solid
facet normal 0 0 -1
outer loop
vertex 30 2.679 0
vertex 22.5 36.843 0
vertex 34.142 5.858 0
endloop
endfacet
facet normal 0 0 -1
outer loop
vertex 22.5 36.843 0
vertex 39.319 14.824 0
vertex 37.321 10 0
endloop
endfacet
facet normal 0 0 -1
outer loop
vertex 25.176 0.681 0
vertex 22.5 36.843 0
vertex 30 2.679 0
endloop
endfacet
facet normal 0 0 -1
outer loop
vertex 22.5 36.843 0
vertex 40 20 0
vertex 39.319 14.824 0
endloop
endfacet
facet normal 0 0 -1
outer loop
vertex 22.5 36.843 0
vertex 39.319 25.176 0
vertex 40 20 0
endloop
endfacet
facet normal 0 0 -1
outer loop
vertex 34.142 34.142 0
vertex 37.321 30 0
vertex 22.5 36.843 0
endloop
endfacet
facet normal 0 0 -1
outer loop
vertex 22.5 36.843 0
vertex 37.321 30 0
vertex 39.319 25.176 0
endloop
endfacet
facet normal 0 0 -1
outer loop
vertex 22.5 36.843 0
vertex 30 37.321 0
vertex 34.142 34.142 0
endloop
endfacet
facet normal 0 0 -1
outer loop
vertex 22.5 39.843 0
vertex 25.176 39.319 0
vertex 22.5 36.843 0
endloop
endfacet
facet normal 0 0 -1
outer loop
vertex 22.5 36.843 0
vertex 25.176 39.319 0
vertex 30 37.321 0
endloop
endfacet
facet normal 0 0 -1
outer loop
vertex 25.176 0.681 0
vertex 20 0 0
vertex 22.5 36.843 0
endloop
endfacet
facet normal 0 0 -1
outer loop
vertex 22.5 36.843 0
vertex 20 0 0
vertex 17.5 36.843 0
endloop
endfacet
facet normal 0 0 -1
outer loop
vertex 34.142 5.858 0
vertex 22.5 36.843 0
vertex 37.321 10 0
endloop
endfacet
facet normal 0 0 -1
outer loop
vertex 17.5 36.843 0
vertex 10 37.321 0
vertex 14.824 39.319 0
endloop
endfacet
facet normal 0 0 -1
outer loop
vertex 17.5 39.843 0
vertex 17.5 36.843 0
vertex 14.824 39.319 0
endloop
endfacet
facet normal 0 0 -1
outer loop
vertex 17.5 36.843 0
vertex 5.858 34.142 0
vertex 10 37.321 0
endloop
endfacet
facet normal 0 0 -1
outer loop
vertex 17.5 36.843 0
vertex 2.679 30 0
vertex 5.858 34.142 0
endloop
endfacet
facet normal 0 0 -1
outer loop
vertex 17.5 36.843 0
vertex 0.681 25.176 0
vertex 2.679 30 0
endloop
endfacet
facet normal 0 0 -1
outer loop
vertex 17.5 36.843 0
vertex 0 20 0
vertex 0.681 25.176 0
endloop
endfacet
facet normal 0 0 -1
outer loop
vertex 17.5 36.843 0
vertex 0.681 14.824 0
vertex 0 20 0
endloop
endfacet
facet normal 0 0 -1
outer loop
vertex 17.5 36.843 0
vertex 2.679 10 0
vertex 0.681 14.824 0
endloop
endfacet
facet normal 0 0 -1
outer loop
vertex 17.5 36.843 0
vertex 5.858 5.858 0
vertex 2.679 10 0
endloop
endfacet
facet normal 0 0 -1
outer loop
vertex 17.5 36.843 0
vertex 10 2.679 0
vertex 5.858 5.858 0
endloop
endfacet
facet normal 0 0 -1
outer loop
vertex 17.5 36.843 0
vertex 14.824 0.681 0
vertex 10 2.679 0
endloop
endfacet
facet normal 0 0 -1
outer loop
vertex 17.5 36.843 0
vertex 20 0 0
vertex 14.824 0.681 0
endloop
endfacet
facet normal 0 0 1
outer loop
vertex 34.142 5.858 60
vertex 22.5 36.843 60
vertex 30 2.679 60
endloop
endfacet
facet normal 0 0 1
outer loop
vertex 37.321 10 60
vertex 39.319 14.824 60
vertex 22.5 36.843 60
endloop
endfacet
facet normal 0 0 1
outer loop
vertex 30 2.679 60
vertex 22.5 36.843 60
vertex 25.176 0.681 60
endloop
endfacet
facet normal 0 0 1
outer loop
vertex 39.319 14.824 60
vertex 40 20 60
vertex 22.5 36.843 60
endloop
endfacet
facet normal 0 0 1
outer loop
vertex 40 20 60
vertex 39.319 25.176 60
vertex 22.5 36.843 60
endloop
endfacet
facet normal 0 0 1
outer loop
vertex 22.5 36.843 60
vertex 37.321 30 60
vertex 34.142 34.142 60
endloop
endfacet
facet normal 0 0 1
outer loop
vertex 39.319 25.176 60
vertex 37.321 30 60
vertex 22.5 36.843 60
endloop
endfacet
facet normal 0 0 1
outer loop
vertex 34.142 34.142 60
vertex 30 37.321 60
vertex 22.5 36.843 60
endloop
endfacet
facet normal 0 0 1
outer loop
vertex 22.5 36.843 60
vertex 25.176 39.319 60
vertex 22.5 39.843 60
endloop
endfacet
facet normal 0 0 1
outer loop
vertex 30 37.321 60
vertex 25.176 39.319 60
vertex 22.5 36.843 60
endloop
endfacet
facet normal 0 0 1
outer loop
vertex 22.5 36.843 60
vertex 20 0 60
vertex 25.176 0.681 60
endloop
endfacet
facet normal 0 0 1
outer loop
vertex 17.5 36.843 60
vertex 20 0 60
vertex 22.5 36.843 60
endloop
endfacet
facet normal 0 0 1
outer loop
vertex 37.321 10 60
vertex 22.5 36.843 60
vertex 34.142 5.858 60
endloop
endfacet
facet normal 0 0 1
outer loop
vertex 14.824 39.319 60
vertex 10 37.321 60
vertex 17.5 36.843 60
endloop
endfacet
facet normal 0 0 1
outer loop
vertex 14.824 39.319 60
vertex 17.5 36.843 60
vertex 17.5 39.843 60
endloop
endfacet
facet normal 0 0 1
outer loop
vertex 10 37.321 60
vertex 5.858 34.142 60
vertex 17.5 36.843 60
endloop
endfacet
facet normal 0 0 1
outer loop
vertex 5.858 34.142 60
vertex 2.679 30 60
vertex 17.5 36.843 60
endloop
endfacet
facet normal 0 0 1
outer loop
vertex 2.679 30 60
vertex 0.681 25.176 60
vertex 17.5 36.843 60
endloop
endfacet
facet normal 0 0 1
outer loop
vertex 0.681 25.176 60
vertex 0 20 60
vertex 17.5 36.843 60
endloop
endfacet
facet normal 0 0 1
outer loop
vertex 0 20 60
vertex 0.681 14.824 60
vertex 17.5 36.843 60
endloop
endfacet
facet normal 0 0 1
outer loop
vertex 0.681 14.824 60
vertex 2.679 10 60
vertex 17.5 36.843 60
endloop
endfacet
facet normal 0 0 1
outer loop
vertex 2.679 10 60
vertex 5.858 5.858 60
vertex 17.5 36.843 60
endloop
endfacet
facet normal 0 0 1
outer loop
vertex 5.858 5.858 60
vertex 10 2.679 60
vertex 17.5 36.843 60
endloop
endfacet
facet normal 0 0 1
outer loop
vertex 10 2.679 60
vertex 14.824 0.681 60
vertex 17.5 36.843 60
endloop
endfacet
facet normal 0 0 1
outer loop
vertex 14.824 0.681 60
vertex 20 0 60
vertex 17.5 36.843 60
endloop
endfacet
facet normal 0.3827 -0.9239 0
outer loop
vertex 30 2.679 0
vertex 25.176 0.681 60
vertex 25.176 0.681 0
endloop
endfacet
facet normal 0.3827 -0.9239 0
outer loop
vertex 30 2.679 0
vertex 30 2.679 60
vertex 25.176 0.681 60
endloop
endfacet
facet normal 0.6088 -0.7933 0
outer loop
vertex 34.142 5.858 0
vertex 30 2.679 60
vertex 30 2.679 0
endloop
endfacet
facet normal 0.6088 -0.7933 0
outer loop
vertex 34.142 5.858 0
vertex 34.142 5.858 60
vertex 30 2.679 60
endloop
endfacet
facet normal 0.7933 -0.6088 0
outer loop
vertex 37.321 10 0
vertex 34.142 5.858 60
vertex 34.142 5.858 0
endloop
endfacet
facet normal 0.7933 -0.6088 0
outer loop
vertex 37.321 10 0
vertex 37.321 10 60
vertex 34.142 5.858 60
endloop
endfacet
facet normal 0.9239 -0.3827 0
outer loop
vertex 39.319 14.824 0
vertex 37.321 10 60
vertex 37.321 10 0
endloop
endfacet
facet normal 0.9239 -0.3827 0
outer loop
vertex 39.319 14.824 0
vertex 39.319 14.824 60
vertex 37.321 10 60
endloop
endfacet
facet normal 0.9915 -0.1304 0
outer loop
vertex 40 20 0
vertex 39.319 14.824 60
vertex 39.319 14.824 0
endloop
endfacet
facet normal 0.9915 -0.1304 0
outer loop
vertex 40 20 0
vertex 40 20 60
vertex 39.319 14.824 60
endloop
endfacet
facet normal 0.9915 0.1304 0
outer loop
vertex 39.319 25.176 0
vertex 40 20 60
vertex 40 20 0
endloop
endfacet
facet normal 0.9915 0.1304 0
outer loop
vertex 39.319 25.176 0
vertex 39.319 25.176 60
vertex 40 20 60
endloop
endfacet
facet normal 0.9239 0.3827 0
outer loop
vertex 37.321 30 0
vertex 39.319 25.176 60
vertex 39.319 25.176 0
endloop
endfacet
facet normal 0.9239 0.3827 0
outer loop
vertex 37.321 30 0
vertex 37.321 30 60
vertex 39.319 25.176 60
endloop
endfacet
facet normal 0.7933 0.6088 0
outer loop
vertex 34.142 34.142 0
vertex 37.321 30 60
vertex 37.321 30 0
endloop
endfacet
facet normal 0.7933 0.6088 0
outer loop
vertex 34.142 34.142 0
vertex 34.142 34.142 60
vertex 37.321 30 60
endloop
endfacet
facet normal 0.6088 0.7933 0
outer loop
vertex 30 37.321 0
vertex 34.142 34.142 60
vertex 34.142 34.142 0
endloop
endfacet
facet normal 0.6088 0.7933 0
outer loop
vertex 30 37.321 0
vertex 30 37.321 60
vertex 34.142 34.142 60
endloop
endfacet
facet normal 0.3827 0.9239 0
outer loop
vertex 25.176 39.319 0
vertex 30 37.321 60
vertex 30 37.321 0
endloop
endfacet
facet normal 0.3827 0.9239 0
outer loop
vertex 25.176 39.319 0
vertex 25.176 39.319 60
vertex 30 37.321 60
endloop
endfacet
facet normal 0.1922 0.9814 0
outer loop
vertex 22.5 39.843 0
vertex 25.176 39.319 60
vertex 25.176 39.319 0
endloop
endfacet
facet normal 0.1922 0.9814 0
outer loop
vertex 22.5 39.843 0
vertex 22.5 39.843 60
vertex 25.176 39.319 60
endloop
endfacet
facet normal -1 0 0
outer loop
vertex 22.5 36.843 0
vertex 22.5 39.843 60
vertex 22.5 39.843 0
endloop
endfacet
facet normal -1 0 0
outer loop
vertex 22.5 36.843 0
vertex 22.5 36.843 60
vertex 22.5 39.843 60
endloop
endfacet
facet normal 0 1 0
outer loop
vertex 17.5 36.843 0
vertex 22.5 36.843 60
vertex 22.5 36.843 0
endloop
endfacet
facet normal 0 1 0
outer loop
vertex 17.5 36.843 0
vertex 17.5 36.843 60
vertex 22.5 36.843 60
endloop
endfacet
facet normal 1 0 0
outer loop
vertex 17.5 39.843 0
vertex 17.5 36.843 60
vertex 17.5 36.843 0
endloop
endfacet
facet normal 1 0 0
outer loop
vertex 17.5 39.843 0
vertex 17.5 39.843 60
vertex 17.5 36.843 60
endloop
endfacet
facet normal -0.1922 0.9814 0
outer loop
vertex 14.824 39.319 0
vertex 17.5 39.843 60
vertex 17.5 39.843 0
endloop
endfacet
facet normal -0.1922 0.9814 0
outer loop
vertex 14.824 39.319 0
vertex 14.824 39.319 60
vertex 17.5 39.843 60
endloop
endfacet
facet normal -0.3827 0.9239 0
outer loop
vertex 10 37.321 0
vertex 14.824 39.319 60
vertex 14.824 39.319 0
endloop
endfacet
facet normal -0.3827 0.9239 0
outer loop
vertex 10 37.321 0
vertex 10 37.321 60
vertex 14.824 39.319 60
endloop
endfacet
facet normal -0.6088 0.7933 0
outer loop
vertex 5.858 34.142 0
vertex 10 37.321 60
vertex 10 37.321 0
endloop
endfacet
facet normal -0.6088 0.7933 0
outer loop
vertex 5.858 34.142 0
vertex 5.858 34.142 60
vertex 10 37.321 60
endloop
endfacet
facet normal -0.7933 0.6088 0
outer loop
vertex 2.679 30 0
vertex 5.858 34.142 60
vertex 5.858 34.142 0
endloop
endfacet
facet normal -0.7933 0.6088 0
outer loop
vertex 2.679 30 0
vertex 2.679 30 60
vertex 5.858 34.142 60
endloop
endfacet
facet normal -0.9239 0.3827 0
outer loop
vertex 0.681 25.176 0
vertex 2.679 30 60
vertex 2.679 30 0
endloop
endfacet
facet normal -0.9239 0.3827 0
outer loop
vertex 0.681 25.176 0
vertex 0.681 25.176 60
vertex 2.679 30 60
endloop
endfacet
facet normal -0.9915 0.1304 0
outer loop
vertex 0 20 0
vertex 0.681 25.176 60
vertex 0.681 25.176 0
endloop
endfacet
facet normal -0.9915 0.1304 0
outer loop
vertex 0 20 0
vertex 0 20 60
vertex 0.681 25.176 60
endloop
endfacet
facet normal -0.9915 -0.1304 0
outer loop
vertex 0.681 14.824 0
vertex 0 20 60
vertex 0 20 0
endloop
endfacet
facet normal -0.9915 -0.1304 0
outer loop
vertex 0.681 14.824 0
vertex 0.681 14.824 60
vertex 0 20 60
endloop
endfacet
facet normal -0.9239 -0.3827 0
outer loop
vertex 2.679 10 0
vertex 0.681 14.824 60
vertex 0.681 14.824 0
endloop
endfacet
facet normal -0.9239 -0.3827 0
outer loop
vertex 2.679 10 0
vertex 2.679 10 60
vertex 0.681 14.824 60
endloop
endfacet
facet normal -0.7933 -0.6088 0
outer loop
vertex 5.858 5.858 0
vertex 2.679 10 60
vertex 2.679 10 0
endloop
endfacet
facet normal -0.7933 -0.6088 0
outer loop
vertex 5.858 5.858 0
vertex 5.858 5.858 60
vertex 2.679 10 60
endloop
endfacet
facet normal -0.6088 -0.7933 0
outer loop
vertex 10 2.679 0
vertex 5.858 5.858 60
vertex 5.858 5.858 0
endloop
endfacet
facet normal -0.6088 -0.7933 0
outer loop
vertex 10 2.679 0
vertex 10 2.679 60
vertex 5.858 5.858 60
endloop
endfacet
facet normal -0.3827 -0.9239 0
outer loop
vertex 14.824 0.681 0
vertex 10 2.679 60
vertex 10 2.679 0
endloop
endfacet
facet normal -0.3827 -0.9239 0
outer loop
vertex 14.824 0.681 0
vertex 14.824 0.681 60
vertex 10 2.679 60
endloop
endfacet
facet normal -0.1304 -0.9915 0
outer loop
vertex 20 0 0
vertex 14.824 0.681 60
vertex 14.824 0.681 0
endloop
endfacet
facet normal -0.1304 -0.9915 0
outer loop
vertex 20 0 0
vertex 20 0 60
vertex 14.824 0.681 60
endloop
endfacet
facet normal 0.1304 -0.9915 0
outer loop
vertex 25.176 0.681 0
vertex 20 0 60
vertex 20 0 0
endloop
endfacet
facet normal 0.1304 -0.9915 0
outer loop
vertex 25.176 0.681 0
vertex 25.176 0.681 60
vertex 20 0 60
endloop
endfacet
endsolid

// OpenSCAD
$fn = 32;

// ----------------------------------------------------------------------
// Keyway shaft: d40 shaft, key 5 x 3 mm
// ----------------------------------------------------------------------

// --- parameters (mm) ---
shaft_r = 20;             // shaft radius
key_w = 5;                // keyway width
key_d = 3;                // keyway depth below the surface line
plate_t = 60;             // shaft length, Z (extrusion height)

shaft_d = 2 * shaft_r;  // shaft diameter
circle_step = 15;  // polygon sampling step, degrees

profile = [[14.824, 39.319], [10, 37.321], [5.858, 34.142], [2.679, 30], [0.681, 25.176], [0, 20], [0.681, 14.824], [2.679, 10], [5.858, 5.858], [10, 2.679], [14.824, 0.681], [20, 0], [25.176, 0.681], [30, 2.679], [34.142, 5.858], [37.321, 10], [39.319, 14.824], [40, 20], [39.319, 25.176], [37.321, 30], [34.142, 34.142], [30, 37.321], [25.176, 39.319], [22.5, 39.843], [22.5, 36.843], [17.5, 36.843], [17.5, 39.843]];  // primary outline, 27 points, counter clockwise

// --- the one profile operation ---
linear_extrude(height = plate_t) polygon(points = profile);
